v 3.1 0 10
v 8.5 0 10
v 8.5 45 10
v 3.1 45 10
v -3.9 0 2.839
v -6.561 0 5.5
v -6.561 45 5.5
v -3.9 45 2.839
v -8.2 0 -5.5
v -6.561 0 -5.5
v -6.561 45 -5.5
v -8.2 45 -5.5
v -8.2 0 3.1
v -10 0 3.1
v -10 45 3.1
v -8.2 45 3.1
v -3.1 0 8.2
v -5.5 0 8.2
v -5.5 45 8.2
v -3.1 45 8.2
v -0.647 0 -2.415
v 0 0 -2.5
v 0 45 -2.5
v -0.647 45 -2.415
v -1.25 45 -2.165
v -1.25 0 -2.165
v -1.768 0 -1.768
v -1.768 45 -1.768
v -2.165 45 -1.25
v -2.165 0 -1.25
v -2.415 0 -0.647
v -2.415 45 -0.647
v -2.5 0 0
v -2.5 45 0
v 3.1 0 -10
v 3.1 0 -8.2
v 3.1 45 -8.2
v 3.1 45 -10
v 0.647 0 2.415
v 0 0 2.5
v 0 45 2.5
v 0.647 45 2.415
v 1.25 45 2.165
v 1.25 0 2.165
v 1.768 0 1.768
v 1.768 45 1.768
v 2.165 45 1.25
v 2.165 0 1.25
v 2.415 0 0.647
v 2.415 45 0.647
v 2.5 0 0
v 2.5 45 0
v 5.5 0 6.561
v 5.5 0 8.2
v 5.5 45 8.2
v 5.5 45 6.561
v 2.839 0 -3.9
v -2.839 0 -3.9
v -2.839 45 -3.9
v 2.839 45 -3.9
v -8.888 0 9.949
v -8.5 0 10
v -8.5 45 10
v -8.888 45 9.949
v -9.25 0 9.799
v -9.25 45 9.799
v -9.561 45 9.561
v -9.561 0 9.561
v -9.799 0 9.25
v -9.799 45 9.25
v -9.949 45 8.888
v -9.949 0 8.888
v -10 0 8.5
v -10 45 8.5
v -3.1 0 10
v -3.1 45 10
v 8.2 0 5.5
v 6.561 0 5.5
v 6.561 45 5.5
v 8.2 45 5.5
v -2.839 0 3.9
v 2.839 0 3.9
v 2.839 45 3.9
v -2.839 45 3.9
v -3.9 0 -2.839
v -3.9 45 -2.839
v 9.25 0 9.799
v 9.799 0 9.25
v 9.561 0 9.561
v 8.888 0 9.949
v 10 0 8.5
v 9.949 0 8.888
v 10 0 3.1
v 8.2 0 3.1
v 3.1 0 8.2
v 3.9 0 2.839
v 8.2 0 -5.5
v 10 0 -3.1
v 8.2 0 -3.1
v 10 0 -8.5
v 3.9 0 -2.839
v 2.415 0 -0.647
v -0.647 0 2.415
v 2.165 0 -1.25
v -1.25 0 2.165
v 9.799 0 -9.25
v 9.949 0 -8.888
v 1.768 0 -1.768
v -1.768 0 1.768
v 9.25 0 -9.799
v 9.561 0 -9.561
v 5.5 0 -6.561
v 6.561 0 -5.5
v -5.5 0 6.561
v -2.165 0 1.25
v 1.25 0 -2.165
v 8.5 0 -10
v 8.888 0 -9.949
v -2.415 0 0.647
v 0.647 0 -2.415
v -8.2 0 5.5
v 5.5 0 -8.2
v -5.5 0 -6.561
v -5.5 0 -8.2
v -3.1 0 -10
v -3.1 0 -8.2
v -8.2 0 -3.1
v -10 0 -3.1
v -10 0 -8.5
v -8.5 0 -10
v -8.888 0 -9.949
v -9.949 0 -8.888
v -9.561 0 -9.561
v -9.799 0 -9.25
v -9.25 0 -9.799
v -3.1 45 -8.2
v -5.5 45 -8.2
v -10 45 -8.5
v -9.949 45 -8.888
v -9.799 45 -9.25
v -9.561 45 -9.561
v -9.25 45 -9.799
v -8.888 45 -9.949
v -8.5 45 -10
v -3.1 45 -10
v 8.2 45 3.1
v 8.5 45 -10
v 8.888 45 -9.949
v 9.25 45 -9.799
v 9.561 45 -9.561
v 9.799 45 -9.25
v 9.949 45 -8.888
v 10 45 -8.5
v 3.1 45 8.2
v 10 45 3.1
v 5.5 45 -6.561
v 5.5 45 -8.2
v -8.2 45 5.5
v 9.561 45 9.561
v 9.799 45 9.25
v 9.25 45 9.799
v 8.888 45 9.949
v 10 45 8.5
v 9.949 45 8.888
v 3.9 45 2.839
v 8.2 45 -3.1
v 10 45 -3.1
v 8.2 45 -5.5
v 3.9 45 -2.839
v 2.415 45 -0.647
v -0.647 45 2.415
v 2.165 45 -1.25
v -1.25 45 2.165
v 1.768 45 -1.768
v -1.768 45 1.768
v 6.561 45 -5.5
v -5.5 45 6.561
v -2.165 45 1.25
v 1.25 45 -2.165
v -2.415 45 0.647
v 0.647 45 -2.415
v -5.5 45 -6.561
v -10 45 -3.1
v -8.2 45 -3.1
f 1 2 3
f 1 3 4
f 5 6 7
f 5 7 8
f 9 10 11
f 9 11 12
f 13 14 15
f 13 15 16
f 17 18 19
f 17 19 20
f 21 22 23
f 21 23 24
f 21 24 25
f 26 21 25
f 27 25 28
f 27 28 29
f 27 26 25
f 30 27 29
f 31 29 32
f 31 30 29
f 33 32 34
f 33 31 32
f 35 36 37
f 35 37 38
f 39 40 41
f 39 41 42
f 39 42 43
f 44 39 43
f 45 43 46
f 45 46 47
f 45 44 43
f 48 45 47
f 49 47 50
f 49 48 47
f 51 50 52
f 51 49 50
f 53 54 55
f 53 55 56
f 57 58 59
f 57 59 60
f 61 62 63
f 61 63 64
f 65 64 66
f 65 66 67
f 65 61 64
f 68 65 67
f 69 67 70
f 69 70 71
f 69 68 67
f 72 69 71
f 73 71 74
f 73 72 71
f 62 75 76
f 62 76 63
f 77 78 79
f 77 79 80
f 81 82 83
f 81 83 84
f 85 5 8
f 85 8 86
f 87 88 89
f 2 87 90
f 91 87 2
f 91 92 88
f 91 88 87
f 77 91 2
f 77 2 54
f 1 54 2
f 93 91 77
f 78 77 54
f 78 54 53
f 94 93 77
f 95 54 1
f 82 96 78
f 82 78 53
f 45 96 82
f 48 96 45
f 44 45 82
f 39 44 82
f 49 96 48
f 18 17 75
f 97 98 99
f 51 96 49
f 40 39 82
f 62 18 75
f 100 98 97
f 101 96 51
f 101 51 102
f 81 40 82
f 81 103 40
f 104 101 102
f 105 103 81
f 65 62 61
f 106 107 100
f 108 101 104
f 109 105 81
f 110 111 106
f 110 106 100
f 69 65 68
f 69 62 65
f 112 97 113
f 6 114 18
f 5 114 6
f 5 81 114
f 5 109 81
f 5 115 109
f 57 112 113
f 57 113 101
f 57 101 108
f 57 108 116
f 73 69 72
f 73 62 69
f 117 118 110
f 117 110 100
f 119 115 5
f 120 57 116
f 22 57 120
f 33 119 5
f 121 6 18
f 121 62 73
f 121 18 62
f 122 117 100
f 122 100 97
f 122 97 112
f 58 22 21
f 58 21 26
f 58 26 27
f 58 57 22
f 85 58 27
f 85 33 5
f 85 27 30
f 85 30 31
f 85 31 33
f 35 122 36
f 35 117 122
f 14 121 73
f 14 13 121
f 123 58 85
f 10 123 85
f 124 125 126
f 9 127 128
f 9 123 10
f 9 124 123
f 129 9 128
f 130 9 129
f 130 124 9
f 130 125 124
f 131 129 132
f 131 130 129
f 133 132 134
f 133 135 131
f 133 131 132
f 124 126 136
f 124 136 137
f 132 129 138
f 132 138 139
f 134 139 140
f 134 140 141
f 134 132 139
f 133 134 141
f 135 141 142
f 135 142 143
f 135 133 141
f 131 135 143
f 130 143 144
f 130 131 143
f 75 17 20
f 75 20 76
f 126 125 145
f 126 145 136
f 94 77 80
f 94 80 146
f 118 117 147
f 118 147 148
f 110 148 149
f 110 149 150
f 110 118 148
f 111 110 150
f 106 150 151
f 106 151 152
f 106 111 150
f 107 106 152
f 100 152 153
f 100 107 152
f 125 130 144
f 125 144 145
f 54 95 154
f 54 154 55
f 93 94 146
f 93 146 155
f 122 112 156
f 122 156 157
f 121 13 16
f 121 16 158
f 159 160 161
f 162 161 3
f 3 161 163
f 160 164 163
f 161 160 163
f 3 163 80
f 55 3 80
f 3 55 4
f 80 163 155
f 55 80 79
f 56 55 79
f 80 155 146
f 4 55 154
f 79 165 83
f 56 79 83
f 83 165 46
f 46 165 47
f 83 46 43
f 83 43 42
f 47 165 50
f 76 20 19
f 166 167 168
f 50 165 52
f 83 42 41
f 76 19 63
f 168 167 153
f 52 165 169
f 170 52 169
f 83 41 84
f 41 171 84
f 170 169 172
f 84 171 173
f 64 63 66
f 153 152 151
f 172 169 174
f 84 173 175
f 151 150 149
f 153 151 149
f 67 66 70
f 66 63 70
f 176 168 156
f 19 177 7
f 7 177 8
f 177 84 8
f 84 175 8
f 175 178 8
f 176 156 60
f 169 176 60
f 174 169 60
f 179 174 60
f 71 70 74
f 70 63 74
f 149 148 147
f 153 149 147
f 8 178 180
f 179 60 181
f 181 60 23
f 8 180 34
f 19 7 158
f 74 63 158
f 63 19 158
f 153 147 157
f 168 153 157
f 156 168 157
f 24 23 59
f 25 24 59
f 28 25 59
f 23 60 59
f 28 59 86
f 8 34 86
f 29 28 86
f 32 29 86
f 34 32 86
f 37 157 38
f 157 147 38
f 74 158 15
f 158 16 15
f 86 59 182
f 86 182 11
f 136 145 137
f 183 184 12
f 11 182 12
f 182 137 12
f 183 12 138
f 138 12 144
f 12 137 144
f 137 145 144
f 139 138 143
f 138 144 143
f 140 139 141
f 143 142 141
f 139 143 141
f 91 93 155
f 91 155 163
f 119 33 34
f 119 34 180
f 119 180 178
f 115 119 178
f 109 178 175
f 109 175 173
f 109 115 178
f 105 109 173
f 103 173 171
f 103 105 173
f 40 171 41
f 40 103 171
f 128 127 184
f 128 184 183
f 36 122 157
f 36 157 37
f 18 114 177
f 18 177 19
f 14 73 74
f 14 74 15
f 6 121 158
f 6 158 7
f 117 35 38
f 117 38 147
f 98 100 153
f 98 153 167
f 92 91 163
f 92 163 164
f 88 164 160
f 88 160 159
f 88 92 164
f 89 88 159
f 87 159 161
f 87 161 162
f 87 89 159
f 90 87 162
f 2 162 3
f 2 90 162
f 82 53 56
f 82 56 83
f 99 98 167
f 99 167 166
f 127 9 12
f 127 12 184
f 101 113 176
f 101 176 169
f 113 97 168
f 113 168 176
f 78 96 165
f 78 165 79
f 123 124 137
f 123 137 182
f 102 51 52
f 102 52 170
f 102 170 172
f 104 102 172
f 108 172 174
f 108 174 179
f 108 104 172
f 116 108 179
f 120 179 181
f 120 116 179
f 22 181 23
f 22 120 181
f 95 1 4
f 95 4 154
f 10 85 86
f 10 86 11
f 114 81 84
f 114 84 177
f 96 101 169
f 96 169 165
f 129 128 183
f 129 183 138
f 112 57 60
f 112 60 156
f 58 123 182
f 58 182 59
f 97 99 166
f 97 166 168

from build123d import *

# Parameters (mm, degrees)
DODANIE_WYCI_GNI_CIE1_DEPTH = 45


with BuildPart() as part:
    # Szkic1 → Dodanie-wyciągnięcie1 (new body)
    with BuildSketch(Plane(origin=(0, 0, 0), x_dir=(1, 0, 0), z_dir=(0, 1, 0))):
        with BuildLine():
            Line((0, 3.9), (2.839339828, 3.9))
            Line((2.839339828, 3.9), (5.5, 6.560660172))
            Line((5.5, 6.560660172), (5.5, 8.2))
            Line((5.5, 8.2), (3.1, 8.2))
            Line((3.1, 8.2), (3.1, 10))
            Line((3.1, 10), (8.5, 10))
            ThreePointArc((8.5, 10), (9.560660172, 9.560660172), (10, 8.5))
            Line((10, 8.5), (10, 3.1))
            Line((10, 3.1), (8.2, 3.1))
            Line((8.2, 3.1), (8.2, 5.5))
            Line((8.2, 5.5), (6.560660172, 5.5))
            Line((6.560660172, 5.5), (3.9, 2.839339828))
            Line((3.9, 2.839339828), (3.9, 0))
            Line((3.9, 0), (3.9, -2.839339828))
            Line((3.9, -2.839339828), (6.560660172, -5.5))
            Line((6.560660172, -5.5), (8.2, -5.5))
            Line((8.2, -5.5), (8.2, -3.1))
            Line((8.2, -3.1), (10, -3.1))
            Line((10, -3.1), (10, -8.5))
            ThreePointArc((10, -8.5), (9.560660172, -9.560660172), (8.5, -10))
            Line((8.5, -10), (3.1, -10))
            Line((3.1, -10), (3.1, -8.2))
            Line((3.1, -8.2), (5.5, -8.2))
            Line((5.5, -8.2), (5.5, -6.560660172))
            Line((5.5, -6.560660172), (2.839339828, -3.9))
            Line((2.839339828, -3.9), (0, -3.9))
            Line((0, -3.9), (-2.839339828, -3.9))
            Line((-2.839339828, -3.9), (-5.5, -6.560660172))
            Line((-5.5, -6.560660172), (-5.5, -8.2))
            Line((-5.5, -8.2), (-3.1, -8.2))
            Line((-3.1, -8.2), (-3.1, -10))
            Line((-3.1, -10), (-8.5, -10))
            ThreePointArc((-8.5, -10), (-9.560660172, -9.560660172), (-10, -8.5))
            Line((-10, -8.5), (-10, -3.1))
            Line((-10, -3.1), (-8.2, -3.1))
            Line((-8.2, -3.1), (-8.2, -5.5))
            Line((-8.2, -5.5), (-6.560660172, -5.5))
            Line((-6.560660172, -5.5), (-3.9, -2.839339828))
            Line((-3.9, -2.839339828), (-3.9, 0))
            Line((-3.9, 0), (-3.9, 2.839339828))
            Line((-3.9, 2.839339828), (-6.560660172, 5.5))
            Line((-6.560660172, 5.5), (-8.2, 5.5))
            Line((-8.2, 5.5), (-8.2, 3.1))
            Line((-8.2, 3.1), (-10, 3.1))
            Line((-10, 3.1), (-10, 8.5))
            ThreePointArc((-10, 8.5), (-9.560660172, 9.560660172), (-8.5, 10))
            Line((-8.5, 10), (-3.1, 10))
            Line((-3.1, 10), (-3.1, 8.2))
            Line((-3.1, 8.2), (-5.5, 8.2))
            Line((-5.5, 8.2), (-5.5, 6.560660172))
            Line((-5.5, 6.560660172), (-2.839339828, 3.9))
            Line((-2.839339828, 3.9), (0, 3.9))
        make_face()
        with BuildLine():
            ThreePointArc((2.5, 0), (1.767766953, 1.767766953), (0, 2.5))
            ThreePointArc((0, 2.5), (-1.767766953, 1.767766953), (-2.5, 0))
            ThreePointArc((-2.5, 0), (-1.767766953, -1.767766953), (0, -2.5))
            ThreePointArc((0, -2.5), (1.767766953, -1.767766953), (2.5, 0))
        make_face(mode=Mode.SUBTRACT)
    extrude(amount=DODANIE_WYCI_GNI_CIE1_DEPTH)


solid = part.part
